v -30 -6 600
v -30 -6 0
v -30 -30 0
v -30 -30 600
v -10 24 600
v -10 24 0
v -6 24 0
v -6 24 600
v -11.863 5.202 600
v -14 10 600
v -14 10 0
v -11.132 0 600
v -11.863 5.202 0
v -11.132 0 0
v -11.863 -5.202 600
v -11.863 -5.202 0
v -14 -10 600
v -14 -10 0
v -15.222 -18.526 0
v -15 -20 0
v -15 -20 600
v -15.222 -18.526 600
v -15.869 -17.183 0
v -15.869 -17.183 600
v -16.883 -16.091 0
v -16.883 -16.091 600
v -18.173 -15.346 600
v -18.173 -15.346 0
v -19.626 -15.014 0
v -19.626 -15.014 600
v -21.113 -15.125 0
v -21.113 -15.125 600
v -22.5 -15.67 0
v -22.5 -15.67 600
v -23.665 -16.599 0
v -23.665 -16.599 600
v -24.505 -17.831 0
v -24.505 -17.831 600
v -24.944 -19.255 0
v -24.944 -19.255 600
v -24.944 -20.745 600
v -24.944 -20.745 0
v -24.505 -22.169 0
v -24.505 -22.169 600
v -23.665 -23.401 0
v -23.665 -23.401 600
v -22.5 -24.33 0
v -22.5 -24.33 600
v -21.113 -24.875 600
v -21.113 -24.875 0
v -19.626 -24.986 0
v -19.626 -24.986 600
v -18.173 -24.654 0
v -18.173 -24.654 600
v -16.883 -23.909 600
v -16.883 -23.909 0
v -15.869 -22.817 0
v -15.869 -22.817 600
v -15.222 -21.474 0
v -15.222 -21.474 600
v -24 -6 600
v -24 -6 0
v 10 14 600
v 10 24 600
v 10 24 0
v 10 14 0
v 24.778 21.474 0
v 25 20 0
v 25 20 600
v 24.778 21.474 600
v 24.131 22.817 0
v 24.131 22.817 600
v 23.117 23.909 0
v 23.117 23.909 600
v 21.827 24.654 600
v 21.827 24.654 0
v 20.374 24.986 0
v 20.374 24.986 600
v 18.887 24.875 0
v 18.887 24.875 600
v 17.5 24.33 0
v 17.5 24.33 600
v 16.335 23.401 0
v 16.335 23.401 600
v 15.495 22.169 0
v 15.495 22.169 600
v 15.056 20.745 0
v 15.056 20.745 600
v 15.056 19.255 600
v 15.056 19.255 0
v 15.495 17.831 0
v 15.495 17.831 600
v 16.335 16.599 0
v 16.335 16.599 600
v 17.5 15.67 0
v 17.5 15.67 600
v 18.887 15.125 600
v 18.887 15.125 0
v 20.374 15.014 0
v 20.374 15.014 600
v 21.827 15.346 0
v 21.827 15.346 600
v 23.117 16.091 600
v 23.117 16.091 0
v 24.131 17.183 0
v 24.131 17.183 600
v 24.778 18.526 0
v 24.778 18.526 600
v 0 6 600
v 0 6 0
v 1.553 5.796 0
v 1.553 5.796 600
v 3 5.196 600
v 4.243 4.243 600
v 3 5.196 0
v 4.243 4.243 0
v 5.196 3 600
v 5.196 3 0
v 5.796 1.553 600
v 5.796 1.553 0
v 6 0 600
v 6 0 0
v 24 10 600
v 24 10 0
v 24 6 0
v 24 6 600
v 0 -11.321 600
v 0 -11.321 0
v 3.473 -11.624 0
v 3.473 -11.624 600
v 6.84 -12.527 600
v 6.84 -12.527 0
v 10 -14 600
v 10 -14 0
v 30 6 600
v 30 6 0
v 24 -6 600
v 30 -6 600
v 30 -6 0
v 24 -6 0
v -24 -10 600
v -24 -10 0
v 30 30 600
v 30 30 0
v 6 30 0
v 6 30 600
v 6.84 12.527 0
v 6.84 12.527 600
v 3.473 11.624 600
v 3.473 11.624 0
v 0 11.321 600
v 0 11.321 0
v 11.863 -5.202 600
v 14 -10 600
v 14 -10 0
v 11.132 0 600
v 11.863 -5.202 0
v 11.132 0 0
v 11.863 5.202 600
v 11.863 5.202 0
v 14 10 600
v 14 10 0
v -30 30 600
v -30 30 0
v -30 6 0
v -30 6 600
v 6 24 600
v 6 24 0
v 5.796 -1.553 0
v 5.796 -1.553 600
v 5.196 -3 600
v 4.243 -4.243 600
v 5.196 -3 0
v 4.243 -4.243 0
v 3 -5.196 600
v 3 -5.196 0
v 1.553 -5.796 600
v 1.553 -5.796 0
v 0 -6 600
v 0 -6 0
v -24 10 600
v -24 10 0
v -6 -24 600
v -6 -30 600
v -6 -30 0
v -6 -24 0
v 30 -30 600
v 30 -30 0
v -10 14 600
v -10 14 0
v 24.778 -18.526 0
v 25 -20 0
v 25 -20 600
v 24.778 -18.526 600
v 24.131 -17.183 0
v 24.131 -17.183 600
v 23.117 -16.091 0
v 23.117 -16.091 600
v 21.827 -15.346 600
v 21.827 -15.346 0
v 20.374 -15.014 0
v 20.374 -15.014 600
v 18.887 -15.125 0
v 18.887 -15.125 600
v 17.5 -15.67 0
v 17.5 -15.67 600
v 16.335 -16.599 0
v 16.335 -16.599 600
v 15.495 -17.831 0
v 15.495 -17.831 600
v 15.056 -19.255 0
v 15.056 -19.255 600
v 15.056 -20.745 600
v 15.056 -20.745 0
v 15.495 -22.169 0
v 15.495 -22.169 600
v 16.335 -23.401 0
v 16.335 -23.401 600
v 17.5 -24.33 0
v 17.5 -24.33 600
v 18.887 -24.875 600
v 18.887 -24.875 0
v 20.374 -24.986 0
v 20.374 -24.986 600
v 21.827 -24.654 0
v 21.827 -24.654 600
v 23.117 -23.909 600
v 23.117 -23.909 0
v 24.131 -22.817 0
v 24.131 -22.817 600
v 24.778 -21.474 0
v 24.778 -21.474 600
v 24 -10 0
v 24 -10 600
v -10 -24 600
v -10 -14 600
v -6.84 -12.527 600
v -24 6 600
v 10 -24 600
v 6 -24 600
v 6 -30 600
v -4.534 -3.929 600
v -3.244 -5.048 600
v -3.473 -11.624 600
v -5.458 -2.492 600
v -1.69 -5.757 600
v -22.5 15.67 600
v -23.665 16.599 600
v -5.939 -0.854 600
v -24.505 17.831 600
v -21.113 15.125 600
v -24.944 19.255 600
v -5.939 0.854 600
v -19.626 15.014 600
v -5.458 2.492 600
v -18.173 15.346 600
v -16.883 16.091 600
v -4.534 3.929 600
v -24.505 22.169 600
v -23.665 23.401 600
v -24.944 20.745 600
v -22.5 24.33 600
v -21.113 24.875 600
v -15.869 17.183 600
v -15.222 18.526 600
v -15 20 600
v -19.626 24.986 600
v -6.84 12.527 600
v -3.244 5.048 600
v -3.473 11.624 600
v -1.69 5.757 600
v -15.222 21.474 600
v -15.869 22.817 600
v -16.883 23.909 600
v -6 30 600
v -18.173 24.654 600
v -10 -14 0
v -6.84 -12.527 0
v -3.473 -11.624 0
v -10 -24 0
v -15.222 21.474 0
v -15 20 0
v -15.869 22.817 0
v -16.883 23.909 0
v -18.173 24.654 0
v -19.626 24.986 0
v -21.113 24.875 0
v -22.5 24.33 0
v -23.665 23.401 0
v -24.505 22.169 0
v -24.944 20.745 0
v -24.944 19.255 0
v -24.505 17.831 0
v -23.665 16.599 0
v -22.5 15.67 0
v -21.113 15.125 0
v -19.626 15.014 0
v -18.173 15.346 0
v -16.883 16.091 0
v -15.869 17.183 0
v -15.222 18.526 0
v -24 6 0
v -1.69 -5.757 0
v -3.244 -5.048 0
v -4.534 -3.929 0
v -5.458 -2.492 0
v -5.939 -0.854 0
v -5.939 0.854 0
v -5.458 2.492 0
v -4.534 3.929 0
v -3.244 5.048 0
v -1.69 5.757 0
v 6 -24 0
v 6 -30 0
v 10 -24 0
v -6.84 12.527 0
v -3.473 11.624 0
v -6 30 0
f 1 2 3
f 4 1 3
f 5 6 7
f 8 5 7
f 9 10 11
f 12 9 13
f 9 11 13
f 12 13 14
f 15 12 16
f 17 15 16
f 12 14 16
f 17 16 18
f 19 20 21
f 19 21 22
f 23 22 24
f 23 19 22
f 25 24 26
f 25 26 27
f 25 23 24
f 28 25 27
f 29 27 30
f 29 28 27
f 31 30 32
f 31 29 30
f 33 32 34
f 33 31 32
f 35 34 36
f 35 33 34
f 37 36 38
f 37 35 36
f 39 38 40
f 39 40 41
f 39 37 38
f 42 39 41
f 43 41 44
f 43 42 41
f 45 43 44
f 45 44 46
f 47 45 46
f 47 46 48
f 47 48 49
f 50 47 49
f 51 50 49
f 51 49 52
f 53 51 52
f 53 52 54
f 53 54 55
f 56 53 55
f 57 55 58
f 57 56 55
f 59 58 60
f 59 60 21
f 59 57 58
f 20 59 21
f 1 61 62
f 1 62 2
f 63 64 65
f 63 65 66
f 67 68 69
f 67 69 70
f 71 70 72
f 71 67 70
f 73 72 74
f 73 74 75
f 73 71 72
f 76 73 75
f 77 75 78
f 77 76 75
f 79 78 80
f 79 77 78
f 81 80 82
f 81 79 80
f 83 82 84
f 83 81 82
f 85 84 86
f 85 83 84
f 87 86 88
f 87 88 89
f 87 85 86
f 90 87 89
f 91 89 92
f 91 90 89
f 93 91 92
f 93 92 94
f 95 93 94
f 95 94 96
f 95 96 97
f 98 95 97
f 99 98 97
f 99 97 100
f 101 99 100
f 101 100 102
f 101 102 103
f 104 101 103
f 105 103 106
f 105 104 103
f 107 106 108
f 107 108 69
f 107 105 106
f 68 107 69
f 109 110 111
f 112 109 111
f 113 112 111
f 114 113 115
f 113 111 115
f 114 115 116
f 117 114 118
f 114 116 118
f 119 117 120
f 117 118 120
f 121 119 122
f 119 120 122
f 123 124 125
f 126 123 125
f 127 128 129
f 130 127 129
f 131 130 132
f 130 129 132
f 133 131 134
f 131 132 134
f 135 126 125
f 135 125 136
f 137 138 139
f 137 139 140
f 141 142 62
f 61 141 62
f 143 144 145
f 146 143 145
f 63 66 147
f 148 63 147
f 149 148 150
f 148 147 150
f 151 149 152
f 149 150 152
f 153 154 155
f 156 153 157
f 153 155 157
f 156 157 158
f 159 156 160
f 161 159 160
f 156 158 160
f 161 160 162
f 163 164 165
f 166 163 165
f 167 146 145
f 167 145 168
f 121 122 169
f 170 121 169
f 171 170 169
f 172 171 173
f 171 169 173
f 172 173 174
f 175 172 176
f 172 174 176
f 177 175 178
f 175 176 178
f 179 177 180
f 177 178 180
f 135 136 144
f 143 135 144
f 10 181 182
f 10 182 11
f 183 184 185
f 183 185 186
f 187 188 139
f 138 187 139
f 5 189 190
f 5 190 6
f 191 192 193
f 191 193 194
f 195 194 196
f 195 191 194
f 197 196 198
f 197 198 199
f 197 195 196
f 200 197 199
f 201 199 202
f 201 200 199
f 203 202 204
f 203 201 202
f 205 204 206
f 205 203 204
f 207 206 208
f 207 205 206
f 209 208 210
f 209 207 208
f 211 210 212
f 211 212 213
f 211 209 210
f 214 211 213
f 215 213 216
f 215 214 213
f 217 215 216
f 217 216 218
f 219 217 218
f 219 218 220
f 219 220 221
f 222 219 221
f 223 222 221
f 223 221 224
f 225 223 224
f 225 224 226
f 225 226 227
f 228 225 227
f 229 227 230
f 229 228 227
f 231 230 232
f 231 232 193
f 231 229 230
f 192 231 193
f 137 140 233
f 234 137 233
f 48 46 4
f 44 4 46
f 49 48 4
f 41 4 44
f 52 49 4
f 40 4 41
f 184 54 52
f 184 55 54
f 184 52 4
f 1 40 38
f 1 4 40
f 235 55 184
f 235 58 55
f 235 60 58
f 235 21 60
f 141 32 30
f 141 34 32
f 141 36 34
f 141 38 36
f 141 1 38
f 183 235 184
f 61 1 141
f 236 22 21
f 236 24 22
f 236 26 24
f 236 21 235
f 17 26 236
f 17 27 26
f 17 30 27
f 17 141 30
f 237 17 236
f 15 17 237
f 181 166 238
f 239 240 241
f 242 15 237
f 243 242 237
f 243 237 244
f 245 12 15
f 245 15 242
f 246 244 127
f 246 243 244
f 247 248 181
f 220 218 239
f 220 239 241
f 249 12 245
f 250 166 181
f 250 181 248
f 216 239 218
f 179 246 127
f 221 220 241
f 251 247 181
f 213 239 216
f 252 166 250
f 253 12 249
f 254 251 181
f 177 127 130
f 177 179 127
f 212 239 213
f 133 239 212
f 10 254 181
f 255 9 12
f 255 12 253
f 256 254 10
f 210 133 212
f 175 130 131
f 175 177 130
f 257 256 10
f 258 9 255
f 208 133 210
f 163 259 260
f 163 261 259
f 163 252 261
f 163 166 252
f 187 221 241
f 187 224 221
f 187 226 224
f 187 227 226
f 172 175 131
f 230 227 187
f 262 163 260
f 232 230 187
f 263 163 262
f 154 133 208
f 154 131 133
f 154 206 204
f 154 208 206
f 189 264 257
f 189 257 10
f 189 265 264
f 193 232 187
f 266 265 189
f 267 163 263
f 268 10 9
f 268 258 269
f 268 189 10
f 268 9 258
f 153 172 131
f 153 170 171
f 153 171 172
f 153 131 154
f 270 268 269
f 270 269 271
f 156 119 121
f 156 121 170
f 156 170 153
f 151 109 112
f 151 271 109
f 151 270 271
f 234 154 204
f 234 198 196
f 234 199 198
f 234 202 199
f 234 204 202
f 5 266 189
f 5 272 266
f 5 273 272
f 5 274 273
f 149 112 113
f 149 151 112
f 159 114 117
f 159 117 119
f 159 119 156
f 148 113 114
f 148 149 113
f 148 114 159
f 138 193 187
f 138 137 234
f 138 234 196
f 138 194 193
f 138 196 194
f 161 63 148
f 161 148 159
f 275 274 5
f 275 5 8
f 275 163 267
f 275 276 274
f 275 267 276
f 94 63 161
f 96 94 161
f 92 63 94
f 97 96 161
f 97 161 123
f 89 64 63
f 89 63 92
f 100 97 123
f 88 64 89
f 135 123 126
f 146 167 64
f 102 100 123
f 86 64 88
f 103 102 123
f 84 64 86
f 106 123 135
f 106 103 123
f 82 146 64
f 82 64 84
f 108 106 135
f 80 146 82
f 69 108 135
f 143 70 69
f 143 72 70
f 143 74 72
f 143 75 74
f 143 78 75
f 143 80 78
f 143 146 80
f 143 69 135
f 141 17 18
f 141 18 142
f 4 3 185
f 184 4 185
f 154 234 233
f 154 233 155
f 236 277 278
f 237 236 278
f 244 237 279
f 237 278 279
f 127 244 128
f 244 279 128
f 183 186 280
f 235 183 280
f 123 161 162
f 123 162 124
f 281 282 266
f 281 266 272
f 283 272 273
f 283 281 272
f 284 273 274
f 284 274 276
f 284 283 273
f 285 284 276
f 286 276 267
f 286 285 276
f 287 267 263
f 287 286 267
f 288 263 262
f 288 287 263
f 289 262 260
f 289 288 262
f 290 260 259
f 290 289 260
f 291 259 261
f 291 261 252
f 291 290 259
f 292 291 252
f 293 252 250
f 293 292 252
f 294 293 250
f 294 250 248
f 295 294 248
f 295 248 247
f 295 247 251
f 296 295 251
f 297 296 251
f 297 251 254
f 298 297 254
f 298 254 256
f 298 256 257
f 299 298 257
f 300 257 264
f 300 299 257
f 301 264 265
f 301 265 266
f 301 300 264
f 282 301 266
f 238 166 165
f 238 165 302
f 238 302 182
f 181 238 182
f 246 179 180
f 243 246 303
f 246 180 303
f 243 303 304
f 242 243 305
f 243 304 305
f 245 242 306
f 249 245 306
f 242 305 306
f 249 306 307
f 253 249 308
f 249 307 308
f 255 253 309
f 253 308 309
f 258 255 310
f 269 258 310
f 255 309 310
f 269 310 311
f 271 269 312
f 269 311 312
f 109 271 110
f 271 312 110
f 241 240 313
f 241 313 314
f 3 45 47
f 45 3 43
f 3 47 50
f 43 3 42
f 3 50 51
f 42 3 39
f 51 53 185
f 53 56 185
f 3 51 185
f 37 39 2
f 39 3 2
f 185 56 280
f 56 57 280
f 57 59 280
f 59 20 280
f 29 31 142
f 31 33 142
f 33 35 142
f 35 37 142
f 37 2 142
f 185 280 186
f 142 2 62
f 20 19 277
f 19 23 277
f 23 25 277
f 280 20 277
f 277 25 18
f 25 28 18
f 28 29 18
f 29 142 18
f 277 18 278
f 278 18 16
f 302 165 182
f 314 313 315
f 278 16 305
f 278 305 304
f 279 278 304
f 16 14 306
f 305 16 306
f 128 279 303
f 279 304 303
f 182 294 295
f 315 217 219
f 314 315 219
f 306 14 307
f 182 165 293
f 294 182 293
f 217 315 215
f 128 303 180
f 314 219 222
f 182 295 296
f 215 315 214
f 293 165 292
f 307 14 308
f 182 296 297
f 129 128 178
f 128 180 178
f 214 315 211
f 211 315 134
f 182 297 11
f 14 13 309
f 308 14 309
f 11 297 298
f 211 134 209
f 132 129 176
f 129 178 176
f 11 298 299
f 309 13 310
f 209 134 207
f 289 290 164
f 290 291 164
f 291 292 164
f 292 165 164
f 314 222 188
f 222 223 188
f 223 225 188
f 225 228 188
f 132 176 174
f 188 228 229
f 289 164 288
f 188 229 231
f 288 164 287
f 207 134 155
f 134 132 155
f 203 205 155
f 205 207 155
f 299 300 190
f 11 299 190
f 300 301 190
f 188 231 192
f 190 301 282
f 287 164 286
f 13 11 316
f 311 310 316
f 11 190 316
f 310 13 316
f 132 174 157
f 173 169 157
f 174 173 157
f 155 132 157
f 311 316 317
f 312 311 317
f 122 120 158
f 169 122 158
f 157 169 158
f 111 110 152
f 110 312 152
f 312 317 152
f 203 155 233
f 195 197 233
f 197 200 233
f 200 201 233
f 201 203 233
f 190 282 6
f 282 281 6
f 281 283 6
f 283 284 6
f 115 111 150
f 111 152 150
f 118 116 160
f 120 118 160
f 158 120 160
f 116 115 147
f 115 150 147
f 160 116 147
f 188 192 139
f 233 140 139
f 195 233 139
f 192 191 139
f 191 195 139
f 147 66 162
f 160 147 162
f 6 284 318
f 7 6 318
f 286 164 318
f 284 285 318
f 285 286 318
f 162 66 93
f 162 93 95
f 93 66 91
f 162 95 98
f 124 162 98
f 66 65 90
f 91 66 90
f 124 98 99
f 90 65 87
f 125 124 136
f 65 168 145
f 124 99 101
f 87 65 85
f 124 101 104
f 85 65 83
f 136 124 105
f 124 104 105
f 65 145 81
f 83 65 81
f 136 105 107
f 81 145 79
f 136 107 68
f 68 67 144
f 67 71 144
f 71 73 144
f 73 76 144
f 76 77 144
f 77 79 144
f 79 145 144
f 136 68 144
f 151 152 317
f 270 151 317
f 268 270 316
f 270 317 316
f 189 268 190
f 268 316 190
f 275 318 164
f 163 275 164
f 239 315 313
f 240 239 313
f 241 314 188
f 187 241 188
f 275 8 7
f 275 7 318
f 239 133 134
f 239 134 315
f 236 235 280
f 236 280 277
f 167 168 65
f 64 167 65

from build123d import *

# Parameters (mm, degrees)
F0_R     = 5
F1_DEPTH = 600


with BuildPart() as f1:
    # F0 (on Top) → F1 (new body)
    with BuildSketch(Plane.XY):
        with BuildLine():
            Line((30, 6), (30, 30))
            Line((30, 30), (6, 30))
            Line((6, 30), (6, 24))
            Line((6, 24), (10, 24))
            Line((10, 24), (10, 14))
            ThreePointArc((10, 14), (5.176381, 12.001992), (0, 11.320508))
            Line((0, 11.320508), (0, 6))
            ThreePointArc((0, 6), (4.242641, 4.242641), (6, 0))
            ThreePointArc((6, 0), (4.242641, -4.242641), (0, -6))
            Line((0, -6), (0, -11.320508))
            ThreePointArc((0, -11.320508), (5.176381, -12.001992), (10, -14))
            Line((10, -14), (10, -24))
            Line((10, -24), (6, -24))
            Line((6, -24), (6, -30))
            Line((6, -30), (30, -30))
            Line((30, -30), (30, -6))
            Line((30, -6), (24, -6))
            Line((24, -6), (24, -10))
            Line((24, -10), (14, -10))
            ThreePointArc((14, -10), (11.132038, 0), (14, 10))
            Line((14, 10), (24, 10))
            Line((24, 10), (24, 6))
            Line((24, 6), (30, 6))
        make_face()
        with Locations((20, -20)):
            Circle(F0_R, mode=Mode.SUBTRACT)
        with Locations((20, 20)):
            Circle(F0_R, mode=Mode.SUBTRACT)
        with BuildLine():
            Line((0, 6), (0, 11.320508))
            ThreePointArc((0, 11.320508), (-5.176381, 12.001992), (-10, 14))
            Line((-10, 14), (-10, 24))
            Line((-10, 24), (-6, 24))
            Line((-6, 24), (-6, 30))
            Line((-6, 30), (-30, 30))
            Line((-30, 30), (-30, 6))
            Line((-30, 6), (-24, 6))
            Line((-24, 6), (-24, 10))
            Line((-24, 10), (-14, 10))
            ThreePointArc((-14, 10), (-11.132038, 0), (-14, -10))
            Line((-14, -10), (-24, -10))
            Line((-24, -10), (-24, -6))
            Line((-24, -6), (-30, -6))
            Line((-30, -6), (-30, -30))
            Line((-30, -30), (-6, -30))
            Line((-6, -30), (-6, -24))
            Line((-6, -24), (-10, -24))
            Line((-10, -24), (-10, -14))
            ThreePointArc((-10, -14), (-5.176381, -12.001992), (0, -11.320508))
            Line((0, -11.320508), (0, -6))
            ThreePointArc((0, -6), (-6, 0), (0, 6))
        make_face()
        with Locations((-20, -20)):
            Circle(F0_R, mode=Mode.SUBTRACT)
        with Locations((-20, 20)):
            Circle(F0_R, mode=Mode.SUBTRACT)
    extrude(amount=F1_DEPTH)


solid = f1.part
